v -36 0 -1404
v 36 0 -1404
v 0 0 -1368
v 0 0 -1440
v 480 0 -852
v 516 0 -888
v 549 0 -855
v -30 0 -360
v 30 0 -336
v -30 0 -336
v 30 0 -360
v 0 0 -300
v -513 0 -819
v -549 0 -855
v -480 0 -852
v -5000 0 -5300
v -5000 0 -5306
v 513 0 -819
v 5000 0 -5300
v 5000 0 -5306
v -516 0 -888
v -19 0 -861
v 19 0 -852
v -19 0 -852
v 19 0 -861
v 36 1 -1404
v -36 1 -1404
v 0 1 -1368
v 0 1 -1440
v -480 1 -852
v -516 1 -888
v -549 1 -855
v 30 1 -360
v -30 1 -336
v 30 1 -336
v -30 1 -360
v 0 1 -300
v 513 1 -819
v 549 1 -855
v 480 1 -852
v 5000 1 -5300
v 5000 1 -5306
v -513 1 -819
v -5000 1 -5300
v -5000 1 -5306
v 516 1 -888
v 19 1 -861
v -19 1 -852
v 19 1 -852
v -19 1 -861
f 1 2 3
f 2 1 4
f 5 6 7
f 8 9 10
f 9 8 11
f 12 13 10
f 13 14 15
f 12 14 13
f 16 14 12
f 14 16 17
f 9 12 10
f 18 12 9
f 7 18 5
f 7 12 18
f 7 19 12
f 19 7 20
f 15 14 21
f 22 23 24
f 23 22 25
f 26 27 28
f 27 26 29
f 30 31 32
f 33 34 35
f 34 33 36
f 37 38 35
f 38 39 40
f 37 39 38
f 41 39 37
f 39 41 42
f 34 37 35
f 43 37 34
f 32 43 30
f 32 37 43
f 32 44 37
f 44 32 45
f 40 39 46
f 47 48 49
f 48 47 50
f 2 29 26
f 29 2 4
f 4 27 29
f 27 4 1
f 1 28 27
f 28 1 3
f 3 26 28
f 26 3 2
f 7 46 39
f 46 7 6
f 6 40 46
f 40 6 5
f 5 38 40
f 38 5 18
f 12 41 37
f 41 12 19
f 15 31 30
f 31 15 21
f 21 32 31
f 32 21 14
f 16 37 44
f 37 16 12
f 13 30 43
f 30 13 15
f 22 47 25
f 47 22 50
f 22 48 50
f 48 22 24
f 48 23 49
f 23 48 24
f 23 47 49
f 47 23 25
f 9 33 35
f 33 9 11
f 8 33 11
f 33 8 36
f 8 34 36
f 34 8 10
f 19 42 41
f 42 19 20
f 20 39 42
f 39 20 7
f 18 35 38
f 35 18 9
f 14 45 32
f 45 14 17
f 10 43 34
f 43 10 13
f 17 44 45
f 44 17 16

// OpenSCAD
$fs = 120;

$vpt = [0,1080,480];
$vpr = [-34,0,0];
$vpf = 45;

foul_line = 6;
plain_color = [1,1,1,0.8];
out_color = [1,0.75,0.75,0.8];
eat_color = [0.5,0.75,1,0.8];

// home, first, second, third, rubber
color([1,1,1]) scale([1,-1,-1]) rotate([90,0,0]) linear_extrude(1) {
    polygon([[-30,30*2+300],[30,30*2+300],[30,30+300],[0,300],[-30,30+300]]);
    polygon([[552-36*2,852],[552-36,852+36],[552,852],[552-36,852-36]]);
    polygon([[0,1404+36],[36,1404],[0,1404-36],[-36,1404]]);
    polygon([[-552+36*2,852],[-552+36,852+36],[-552,852],[-552+36,852-36]]);
    polygon([[-19,852],[19,852],[19,9+852],[-19,9+852]]);
}

// foul lines
color([1,1,1,0.5]) scale([1,-1,-1]) rotate([90,0,0]) linear_extrude(1) {
    polygon([[0,300],[-5000,300+5000],[-5000,300+5000+foul_line],[0,300+foul_line]]);
    polygon([[0,300],[5000,300+5000],[5000,300+5000+foul_line],[0,300+foul_line]]);
}

scale([0.1,0.1,-0.1]) translate([-23200,0,0]) {
    color(out_color) polyhedron([[5770,0,15185],[23966,0,33393],[5770,600,15185],[23966,600,33393]], [[0,1,3,2]]);
    color(out_color) polyhedron([[5770,0,15185],[5770,0,15195],[5770,600,15185],[5770,600,15195]], [[0,1,3,2]]);
    color(out_color) polyhedron([[23966,0,33393],[23966,0,33493],[23966,600,33393],[23966,600,33493]], [[0,1,3,2]]);
    color(out_color) polyhedron([[5770,0,15195],[23966,0,33493],[5770,600,15195],[23966,600,33493]], [[0,1,3,2]]);
    color(out_color) polyhedron([[5770,600,15185],[5770,600,15195],[23966,600,33393],[23966,600,33493]], [[0,1,3,2]]);
    color(out_color) polyhedron([[10460,0,23160],[10770,0,23610],[10460,20000,23160],[10770,20000,23610]], [[0,1,3,2]]);
    color(out_color) polyhedron([[10460,0,23160],[10460,0,23170],[10460,20000,23160],[10460,20000,23170]], [[0,1,3,2]]);
    color(out_color) polyhedron([[10770,0,23610],[10770,0,23650],[10770,20000,23610],[10770,20000,23650]], [[0,1,3,2]]);
    color(out_color) polyhedron([[10460,0,23170],[10770,0,23650],[10460,20000,23170],[10770,20000,23650]], [[0,1,3,2]]);
    color(out_color) polyhedron([[10460,20000,23160],[10460,20000,23170],[10770,20000,23610],[10770,20000,23650]], [[0,1,3,2]]);
    color(out_color) polyhedron([[14730,0,27560],[18470,0,30820],[14730,1500,27560],[18470,1500,30820]], [[0,1,3,2]]);
    color(out_color) polyhedron([[14730,0,27560],[12749,0,28980],[14730,1500,27560],[12749,1500,28980]], [[0,1,3,2]]);
    color(out_color) polyhedron([[18470,0,30820],[16500,0,33600],[18470,1500,30820],[16500,1500,33600]], [[0,1,3,2]]);
    color(out_color) polyhedron([[12749,0,28980],[16500,0,33600],[12749,1500,28980],[16500,1500,33600]], [[0,1,3,2]]);
    color(out_color) polyhedron([[14730,1500,27560],[12749,1500,28980],[18470,1500,30820],[16500,1500,33600]], [[0,1,3,2]]);
    color(out_color) polyhedron([[18480,0,30820],[20430,0,32940],[18480,1000,30820],[20430,1000,32940]], [[0,1,3,2]]);
    color(out_color) polyhedron([[18480,0,30820],[16500,0,33600],[18480,1000,30820],[16500,1000,33600]], [[0,1,3,2]]);
    color(out_color) polyhedron([[20430,0,32940],[17698,0,34360],[20430,1000,32940],[17698,1000,34360]], [[0,1,3,2]]);
    color(out_color) polyhedron([[16500,0,33600],[17698,0,34360],[16500,1000,33600],[17698,1000,34360]], [[0,1,3,2]]);
    color(out_color) polyhedron([[18480,1000,30820],[16500,1000,33600],[20430,1000,32940],[17698,1000,34360]], [[0,1,3,2]]);
    color(out_color) polyhedron([[21320,0,33820],[23710,0,36505],[21320,10000,33820],[23710,10000,36505]], [[0,1,3,2]]);
    color(out_color) polyhedron([[21320,0,33820],[19873,0,36432],[21320,10000,33820],[19873,10000,36432]], [[0,1,3,2]]);
    color(out_color) polyhedron([[23710,0,36505],[28681,0,46300],[23710,10000,36505],[28681,10000,46300]], [[0,1,3,2]]);
    color(out_color) polyhedron([[19873,0,36432],[28681,0,46300],[19873,10000,36432],[28681,10000,46300]], [[0,1,3,2]]);
    color(out_color) polyhedron([[21320,10000,33820],[19873,10000,36432],[23710,10000,36505],[28681,10000,46300]], [[0,1,3,2]]);
    color(out_color) polyhedron([[33370,0,22930],[41890,0,31120],[33370,20000,22930],[41890,20000,31120]], [[0,1,3,2]]);
    color(out_color) polyhedron([[33370,0,22930],[23976,0,33393],[33370,20000,22930],[23976,20000,33393]], [[0,1,3,2]]);
    color(out_color) polyhedron([[41890,0,31120],[24076,0,33693],[41890,20000,31120],[24076,20000,33693]], [[0,1,3,2]]);
    color(out_color) polyhedron([[23976,0,33393],[24076,0,33693],[23976,20000,33393],[24076,20000,33693]], [[0,1,3,2]]);
    color(out_color) polyhedron([[33370,20000,22930],[23976,20000,33393],[41890,20000,31120],[24076,20000,33693]], [[0,1,3,2]]);
    color(out_color) polyhedron([[33369,0,22930],[40000,0,18357],[33369,1900,22930],[40000,1900,18357]], [[0,1,3,2]]);
    color(out_color) polyhedron([[33369,0,22930],[33369,0,22940],[33369,1900,22930],[33369,1900,22940]], [[0,1,3,2]]);
    color(out_color) polyhedron([[40000,0,18357],[40000,0,18367],[40000,1900,18357],[40000,1900,18367]], [[0,1,3,2]]);
    color(out_color) polyhedron([[33369,0,22940],[40000,0,18367],[33369,1900,22940],[40000,1900,18367]], [[0,1,3,2]]);
    color(out_color) polyhedron([[33369,1900,22930],[33369,1900,22940],[40000,1900,18357],[40000,1900,18367]], [[0,1,3,2]]);
    color(out_color) polyhedron([[36160,0,23390],[37630,0,24803],[36160,1200,23390],[37630,1200,24803]], [[0,1,3,2]]);
    color(out_color) polyhedron([[36160,0,23390],[35280,0,24766],[36160,1200,23390],[35280,1600,24766]], [[0,1,3,2]]);
    color(out_color) polyhedron([[37630,0,24803],[36750,0,26180],[37630,1200,24803],[36750,1600,26180]], [[0,1,3,2]]);
    color(out_color) polyhedron([[35280,0,24766],[36750,0,26180],[35280,1600,24766],[36750,1600,26180]], [[0,1,3,2]]);
    color(out_color) polyhedron([[36160,1200,23390],[35280,1600,24766],[37630,1200,24803],[36750,1600,26180]], [[0,1,3,2]]);
    color(out_color) polyhedron([[27830,0,1910],[33470,0,7440],[27830,5,1910],[33470,5,7440]], [[0,1,3,2]]);
    color(out_color) polyhedron([[27830,0,1910],[27840,0,1910],[27830,5,1910],[27840,5,1910]], [[0,1,3,2]]);
    color(out_color) polyhedron([[33470,0,7440],[33480,0,7440],[33470,5,7440],[33480,5,7440]], [[0,1,3,2]]);
    color(out_color) polyhedron([[27840,0,1910],[33480,0,7440],[27840,5,1910],[33480,5,7440]], [[0,1,3,2]]);
    color(out_color) polyhedron([[27830,5,1910],[27840,5,1910],[33470,5,7440],[33480,5,7440]], [[0,1,3,2]]);
    color(out_color) polyhedron([[13960,0,4590],[18500,0,4590],[13960,5,4590],[18500,5,4590]], [[0,1,3,2]]);
    color(out_color) polyhedron([[13960,0,4590],[13960,0,4690],[13960,5,4590],[13960,5,4690]], [[0,1,3,2]]);
    color(out_color) polyhedron([[18500,0,4590],[18500,0,4690],[18500,5,4590],[18500,5,4690]], [[0,1,3,2]]);
    color(out_color) polyhedron([[13960,0,4690],[18500,0,4690],[13960,5,4690],[18500,5,4690]], [[0,1,3,2]]);
    color(out_color) polyhedron([[13960,5,4590],[13960,5,4690],[18500,5,4590],[18500,5,4690]], [[0,1,3,2]]);
    color(out_color) polyhedron([[19090,0,1880],[19190,0,1880],[19090,5,1880],[19190,5,1880]], [[0,1,3,2]]);
    color(out_color) polyhedron([[19090,0,1880],[18500,0,4560],[19090,5,1880],[18500,5,4560]], [[0,1,3,2]]);
    color(out_color) polyhedron([[19190,0,1880],[18600,0,4560],[19190,5,1880],[18600,5,4560]], [[0,1,3,2]]);
    color(out_color) polyhedron([[18500,0,4560],[18600,0,4560],[18500,5,4560],[18600,5,4560]], [[0,1,3,2]]);
    color(out_color) polyhedron([[19090,5,1880],[18500,5,4560],[19190,5,1880],[18600,5,4560]], [[0,1,3,2]]);
    color(plain_color) polyhedron([[0,0,0],[0,0,0],[0,0,0],[0,0,0]], [[0,1,3,2]]);
    color(plain_color) polyhedron([[0,0,0],[0,0,0],[0,0,0],[0,0,0]], [[0,1,3,2]]);
    color(plain_color) polyhedron([[0,0,0],[0,0,0],[0,0,0],[0,0,0]], [[0,1,3,2]]);
    color(plain_color) polyhedron([[0,0,0],[0,0,0],[0,0,0],[0,0,0]], [[0,1,3,2]]);
    color(plain_color) polyhedron([[0,0,0],[0,0,0],[0,0,0],[0,0,0]], [[0,1,3,2]]);
    color(plain_color) polyhedron([[0,0,0],[0,0,0],[0,0,0],[0,0,0]], [[0,1,3,2]]);
    color(plain_color) polyhedron([[0,0,0],[0,0,0],[0,0,0],[0,0,0]], [[0,1,3,2]]);
    color(plain_color) polyhedron([[0,0,0],[0,0,0],[0,0,0],[0,0,0]], [[0,1,3,2]]);
    color(plain_color) polyhedron([[0,0,0],[0,0,0],[0,0,0],[0,0,0]], [[0,1,3,2]]);
    color(plain_color) polyhedron([[0,0,0],[0,0,0],[0,0,0],[0,0,0]], [[0,1,3,2]]);
    color(plain_color) polyhedron([[0,0,0],[0,0,0],[0,0,0],[0,0,0]], [[0,1,3,2]]);
    color(plain_color) polyhedron([[0,0,0],[0,0,0],[0,0,0],[0,0,0]], [[0,1,3,2]]);
    color(plain_color) polyhedron([[0,0,0],[0,0,0],[0,0,0],[0,0,0]], [[0,1,3,2]]);
    color(plain_color) polyhedron([[0,0,0],[0,0,0],[0,0,0],[0,0,0]], [[0,1,3,2]]);
    color(plain_color) polyhedron([[0,0,0],[0,0,0],[0,0,0],[0,0,0]], [[0,1,3,2]]);
    color(plain_color) polyhedron([[0,0,0],[0,0,0],[0,0,0],[0,0,0]], [[0,1,3,2]]);
    color(plain_color) polyhedron([[0,0,0],[0,0,0],[0,0,0],[0,0,0]], [[0,1,3,2]]);
    color(plain_color) polyhedron([[0,0,0],[0,0,0],[0,0,0],[0,0,0]], [[0,1,3,2]]);
    color(plain_color) polyhedron([[0,0,0],[0,0,0],[0,0,0],[0,0,0]], [[0,1,3,2]]);
    color(plain_color) polyhedron([[0,0,0],[0,0,0],[0,0,0],[0,0,0]], [[0,1,3,2]]);
    color(plain_color) polyhedron([[0,0,0],[0,0,0],[0,0,0],[0,0,0]], [[0,1,3,2]]);
    color(plain_color) polyhedron([[0,0,0],[0,0,0],[0,0,0],[0,0,0]], [[0,1,3,2]]);
    color(plain_color) polyhedron([[0,0,0],[0,0,0],[0,0,0],[0,0,0]], [[0,1,3,2]]);
    color(plain_color) polyhedron([[0,0,0],[0,0,0],[0,0,0],[0,0,0]], [[0,1,3,2]]);
    color(plain_color) polyhedron([[0,0,0],[0,0,0],[0,0,0],[0,0,0]], [[0,1,3,2]]);
    color(plain_color) polyhedron([[0,0,0],[0,0,0],[0,0,0],[0,0,0]], [[0,1,3,2]]);
    color(plain_color) polyhedron([[0,0,0],[0,0,0],[0,0,0],[0,0,0]], [[0,1,3,2]]);
    color(plain_color) polyhedron([[0,0,0],[0,0,0],[0,0,0],[0,0,0]], [[0,1,3,2]]);
    color(plain_color) polyhedron([[0,0,0],[0,0,0],[0,0,0],[0,0,0]], [[0,1,3,2]]);
    color(plain_color) polyhedron([[0,0,0],[0,0,0],[0,0,0],[0,0,0]], [[0,1,3,2]]);
    color(plain_color) polyhedron([[0,0,0],[0,0,0],[0,0,0],[0,0,0]], [[0,1,3,2]]);
    color(plain_color) polyhedron([[0,0,0],[0,0,0],[0,0,0],[0,0,0]], [[0,1,3,2]]);
    color(plain_color) polyhedron([[0,0,0],[0,0,0],[0,0,0],[0,0,0]], [[0,1,3,2]]);
    color(plain_color) polyhedron([[0,0,0],[0,0,0],[0,0,0],[0,0,0]], [[0,1,3,2]]);
    color(plain_color) polyhedron([[0,0,0],[0,0,0],[0,0,0],[0,0,0]], [[0,1,3,2]]);
    color(plain_color) polyhedron([[0,0,0],[0,0,0],[0,0,0],[0,0,0]], [[0,1,3,2]]);
    color(plain_color) polyhedron([[0,0,0],[0,0,0],[0,0,0],[0,0,0]], [[0,1,3,2]]);
    color(plain_color) polyhedron([[0,0,0],[0,0,0],[0,0,0],[0,0,0]], [[0,1,3,2]]);
    color(plain_color) polyhedron([[0,0,0],[0,0,0],[0,0,0],[0,0,0]], [[0,1,3,2]]);
    color(plain_color) polyhedron([[0,0,0],[0,0,0],[0,0,0],[0,0,0]], [[0,1,3,2]]);
    color(plain_color) polyhedron([[0,0,0],[0,0,0],[0,0,0],[0,0,0]], [[0,1,3,2]]);
    color(plain_color) polyhedron([[0,0,0],[0,0,0],[0,0,0],[0,0,0]], [[0,1,3,2]]);
    color(plain_color) polyhedron([[0,0,0],[0,0,0],[0,0,0],[0,0,0]], [[0,1,3,2]]);
    color(plain_color) polyhedron([[0,0,0],[0,0,0],[0,0,0],[0,0,0]], [[0,1,3,2]]);
    color(plain_color) polyhedron([[0,0,0],[0,0,0],[0,0,0],[0,0,0]], [[0,1,3,2]]);
    color(plain_color) polyhedron([[0,0,0],[0,0,0],[0,0,0],[0,0,0]], [[0,1,3,2]]);
    color(plain_color) polyhedron([[0,0,0],[0,0,0],[0,0,0],[0,0,0]], [[0,1,3,2]]);
    color(plain_color) polyhedron([[0,0,0],[0,0,0],[0,0,0],[0,0,0]], [[0,1,3,2]]);
    color(plain_color) polyhedron([[0,0,0],[0,0,0],[0,0,0],[0,0,0]], [[0,1,3,2]]);
    color(plain_color) polyhedron([[0,0,0],[0,0,0],[0,0,0],[0,0,0]], [[0,1,3,2]]);
    color(plain_color) polyhedron([[0,0,0],[0,0,0],[0,0,0],[0,0,0]], [[0,1,3,2]]);
    color(plain_color) polyhedron([[0,0,0],[0,0,0],[0,0,0],[0,0,0]], [[0,1,3,2]]);
    color(plain_color) polyhedron([[0,0,0],[0,0,0],[0,0,0],[0,0,0]], [[0,1,3,2]]);
    color(plain_color) polyhedron([[0,0,0],[0,0,0],[0,0,0],[0,0,0]], [[0,1,3,2]]);
    color(plain_color) polyhedron([[0,0,0],[0,0,0],[0,0,0],[0,0,0]], [[0,1,3,2]]);
    color(plain_color) polyhedron([[0,0,0],[0,0,0],[0,0,0],[0,0,0]], [[0,1,3,2]]);
    color(plain_color) polyhedron([[0,0,0],[0,0,0],[0,0,0],[0,0,0]], [[0,1,3,2]]);
    color(plain_color) polyhedron([[0,0,0],[0,0,0],[0,0,0],[0,0,0]], [[0,1,3,2]]);
    color(plain_color) polyhedron([[0,0,0],[0,0,0],[0,0,0],[0,0,0]], [[0,1,3,2]]);
    color(plain_color) polyhedron([[0,0,0],[0,0,0],[0,0,0],[0,0,0]], [[0,1,3,2]]);
    color(plain_color) polyhedron([[0,0,0],[0,0,0],[0,0,0],[0,0,0]], [[0,1,3,2]]);
    color(plain_color) polyhedron([[0,0,0],[0,0,0],[0,0,0],[0,0,0]], [[0,1,3,2]]);
    color(plain_color) polyhedron([[0,0,0],[0,0,0],[0,0,0],[0,0,0]], [[0,1,3,2]]);
    color(plain_color) polyhedron([[0,0,0],[0,0,0],[0,0,0],[0,0,0]], [[0,1,3,2]]);
    color(plain_color) polyhedron([[0,0,0],[0,0,0],[0,0,0],[0,0,0]], [[0,1,3,2]]);
    color(plain_color) polyhedron([[0,0,0],[0,0,0],[0,0,0],[0,0,0]], [[0,1,3,2]]);
    color(plain_color) polyhedron([[0,0,0],[0,0,0],[0,0,0],[0,0,0]], [[0,1,3,2]]);
    color(plain_color) polyhedron([[0,0,0],[0,0,0],[0,0,0],[0,0,0]], [[0,1,3,2]]);
    color(plain_color) polyhedron([[0,0,0],[0,0,0],[0,0,0],[0,0,0]], [[0,1,3,2]]);
    color(plain_color) polyhedron([[0,0,0],[0,0,0],[0,0,0],[0,0,0]], [[0,1,3,2]]);
    color(plain_color) polyhedron([[0,0,0],[0,0,0],[0,0,0],[0,0,0]], [[0,1,3,2]]);
    color(plain_color) polyhedron([[0,0,0],[0,0,0],[0,0,0],[0,0,0]], [[0,1,3,2]]);
    color(plain_color) polyhedron([[0,0,0],[0,0,0],[0,0,0],[0,0,0]], [[0,1,3,2]]);
    color(plain_color) polyhedron([[0,0,0],[0,0,0],[0,0,0],[0,0,0]], [[0,1,3,2]]);
    color(plain_color) polyhedron([[0,0,0],[0,0,0],[0,0,0],[0,0,0]], [[0,1,3,2]]);
    color(plain_color) polyhedron([[0,0,0],[0,0,0],[0,0,0],[0,0,0]], [[0,1,3,2]]);
    color(plain_color) polyhedron([[0,0,0],[0,0,0],[0,0,0],[0,0,0]], [[0,1,3,2]]);
    color(plain_color) polyhedron([[0,0,0],[0,0,0],[0,0,0],[0,0,0]], [[0,1,3,2]]);
    color(plain_color) polyhedron([[0,0,0],[0,0,0],[0,0,0],[0,0,0]], [[0,1,3,2]]);
    color(plain_color) polyhedron([[0,0,0],[0,0,0],[0,0,0],[0,0,0]], [[0,1,3,2]]);
    color(plain_color) polyhedron([[0,0,0],[0,0,0],[0,0,0],[0,0,0]], [[0,1,3,2]]);
    color(plain_color) polyhedron([[0,0,0],[0,0,0],[0,0,0],[0,0,0]], [[0,1,3,2]]);
    color(plain_color) polyhedron([[0,0,0],[0,0,0],[0,0,0],[0,0,0]], [[0,1,3,2]]);
    color(plain_color) polyhedron([[0,0,0],[0,0,0],[0,0,0],[0,0,0]], [[0,1,3,2]]);
    color(plain_color) polyhedron([[0,0,0],[0,0,0],[0,0,0],[0,0,0]], [[0,1,3,2]]);
    color(plain_color) polyhedron([[0,0,0],[0,0,0],[0,0,0],[0,0,0]], [[0,1,3,2]]);
    color(plain_color) polyhedron([[0,0,0],[0,0,0],[0,0,0],[0,0,0]], [[0,1,3,2]]);
    color(plain_color) polyhedron([[0,0,0],[0,0,0],[0,0,0],[0,0,0]], [[0,1,3,2]]);
    color(plain_color) polyhedron([[0,0,0],[0,0,0],[0,0,0],[0,0,0]], [[0,1,3,2]]);
    color(plain_color) polyhedron([[0,0,0],[0,0,0],[0,0,0],[0,0,0]], [[0,1,3,2]]);
    color(plain_color) polyhedron([[0,0,0],[0,0,0],[0,0,0],[0,0,0]], [[0,1,3,2]]);
    color(plain_color) polyhedron([[0,0,0],[0,0,0],[0,0,0],[0,0,0]], [[0,1,3,2]]);
    color(plain_color) polyhedron([[0,0,0],[0,0,0],[0,0,0],[0,0,0]], [[0,1,3,2]]);
    color(plain_color) polyhedron([[0,0,0],[0,0,0],[0,0,0],[0,0,0]], [[0,1,3,2]]);
    color(plain_color) polyhedron([[0,0,0],[0,0,0],[0,0,0],[0,0,0]], [[0,1,3,2]]);
    color(plain_color) polyhedron([[0,0,0],[0,0,0],[0,0,0],[0,0,0]], [[0,1,3,2]]);
    color(plain_color) polyhedron([[0,0,0],[0,0,0],[0,0,0],[0,0,0]], [[0,1,3,2]]);
    color(plain_color) polyhedron([[0,0,0],[0,0,0],[0,0,0],[0,0,0]], [[0,1,3,2]]);
    color(plain_color) polyhedron([[0,0,0],[0,0,0],[0,0,0],[0,0,0]], [[0,1,3,2]]);
    color(plain_color) polyhedron([[0,0,0],[0,0,0],[0,0,0],[0,0,0]], [[0,1,3,2]]);
    color(plain_color) polyhedron([[0,0,0],[0,0,0],[0,0,0],[0,0,0]], [[0,1,3,2]]);
    color(plain_color) polyhedron([[0,0,0],[0,0,0],[0,0,0],[0,0,0]], [[0,1,3,2]]);
    color(plain_color) polyhedron([[0,0,0],[0,0,0],[0,0,0],[0,0,0]], [[0,1,3,2]]);
    color(plain_color) polyhedron([[0,0,0],[0,0,0],[0,0,0],[0,0,0]], [[0,1,3,2]]);
    color(plain_color) polyhedron([[0,0,0],[0,0,0],[0,0,0],[0,0,0]], [[0,1,3,2]]);
    color(plain_color) polyhedron([[0,0,0],[0,0,0],[0,0,0],[0,0,0]], [[0,1,3,2]]);
    color(plain_color) polyhedron([[0,0,0],[0,0,0],[0,0,0],[0,0,0]], [[0,1,3,2]]);
    color(plain_color) polyhedron([[0,0,0],[0,0,0],[0,0,0],[0,0,0]], [[0,1,3,2]]);
    color(plain_color) polyhedron([[0,0,0],[0,0,0],[0,0,0],[0,0,0]], [[0,1,3,2]]);
    color(plain_color) polyhedron([[0,0,0],[0,0,0],[0,0,0],[0,0,0]], [[0,1,3,2]]);
    color(plain_color) polyhedron([[0,0,0],[0,0,0],[0,0,0],[0,0,0]], [[0,1,3,2]]);
    color(plain_color) polyhedron([[0,0,0],[0,0,0],[0,0,0],[0,0,0]], [[0,1,3,2]]);
    color(plain_color) polyhedron([[0,0,0],[0,0,0],[0,0,0],[0,0,0]], [[0,1,3,2]]);
    color(plain_color) polyhedron([[0,0,0],[0,0,0],[0,0,0],[0,0,0]], [[0,1,3,2]]);
    color(plain_color) polyhedron([[0,0,0],[0,0,0],[0,0,0],[0,0,0]], [[0,1,3,2]]);
    color(plain_color) polyhedron([[0,0,0],[0,0,0],[0,0,0],[0,0,0]], [[0,1,3,2]]);
    color(plain_color) polyhedron([[0,0,0],[0,0,0],[0,0,0],[0,0,0]], [[0,1,3,2]]);
    color(plain_color) polyhedron([[0,0,0],[0,0,0],[0,0,0],[0,0,0]], [[0,1,3,2]]);
    color(plain_color) polyhedron([[0,0,0],[0,0,0],[0,0,0],[0,0,0]], [[0,1,3,2]]);
    color(plain_color) polyhedron([[0,0,0],[0,0,0],[0,0,0],[0,0,0]], [[0,1,3,2]]);
    color(plain_color) polyhedron([[0,0,0],[0,0,0],[0,0,0],[0,0,0]], [[0,1,3,2]]);
    color(plain_color) polyhedron([[0,0,0],[0,0,0],[0,0,0],[0,0,0]], [[0,1,3,2]]);
    color(plain_color) polyhedron([[0,0,0],[0,0,0],[0,0,0],[0,0,0]], [[0,1,3,2]]);
    color(plain_color) polyhedron([[0,0,0],[0,0,0],[0,0,0],[0,0,0]], [[0,1,3,2]]);
    color(plain_color) polyhedron([[0,0,0],[0,0,0],[0,0,0],[0,0,0]], [[0,1,3,2]]);
    color(plain_color) polyhedron([[0,0,0],[0,0,0],[0,0,0],[0,0,0]], [[0,1,3,2]]);
    color(plain_color) polyhedron([[0,0,0],[0,0,0],[0,0,0],[0,0,0]], [[0,1,3,2]]);
    color(plain_color) polyhedron([[0,0,0],[0,0,0],[0,0,0],[0,0,0]], [[0,1,3,2]]);
    color(plain_color) polyhedron([[0,0,0],[0,0,0],[0,0,0],[0,0,0]], [[0,1,3,2]]);
    color(plain_color) polyhedron([[0,0,0],[0,0,0],[0,0,0],[0,0,0]], [[0,1,3,2]]);
    color(plain_color) polyhedron([[0,0,0],[0,0,0],[0,0,0],[0,0,0]], [[0,1,3,2]]);
    color(plain_color) polyhedron([[0,0,0],[0,0,0],[0,0,0],[0,0,0]], [[0,1,3,2]]);
    color(plain_color) polyhedron([[0,0,0],[0,0,0],[0,0,0],[0,0,0]], [[0,1,3,2]]);
    color(plain_color) polyhedron([[0,0,0],[0,0,0],[0,0,0],[0,0,0]], [[0,1,3,2]]);
    color(plain_color) polyhedron([[0,0,0],[0,0,0],[0,0,0],[0,0,0]], [[0,1,3,2]]);
    color(plain_color) polyhedron([[0,0,0],[0,0,0],[0,0,0],[0,0,0]], [[0,1,3,2]]);
    color(plain_color) polyhedron([[0,0,0],[0,0,0],[0,0,0],[0,0,0]], [[0,1,3,2]]);
    color(plain_color) polyhedron([[0,0,0],[0,0,0],[0,0,0],[0,0,0]], [[0,1,3,2]]);
    color(plain_color) polyhedron([[0,0,0],[0,0,0],[0,0,0],[0,0,0]], [[0,1,3,2]]);
    color(plain_color) polyhedron([[0,0,0],[0,0,0],[0,0,0],[0,0,0]], [[0,1,3,2]]);
    color(plain_color) polyhedron([[0,0,0],[0,0,0],[0,0,0],[0,0,0]], [[0,1,3,2]]);
    color(plain_color) polyhedron([[0,0,0],[0,0,0],[0,0,0],[0,0,0]], [[0,1,3,2]]);
    color(plain_color) polyhedron([[0,0,0],[0,0,0],[0,0,0],[0,0,0]], [[0,1,3,2]]);
    color(plain_color) polyhedron([[0,0,0],[0,0,0],[0,0,0],[0,0,0]], [[0,1,3,2]]);
    color(plain_color) polyhedron([[0,0,0],[0,0,0],[0,0,0],[0,0,0]], [[0,1,3,2]]);
    color(plain_color) polyhedron([[0,0,0],[0,0,0],[0,0,0],[0,0,0]], [[0,1,3,2]]);
    color(plain_color) polyhedron([[0,0,0],[0,0,0],[0,0,0],[0,0,0]], [[0,1,3,2]]);
    color(plain_color) polyhedron([[0,0,0],[0,0,0],[0,0,0],[0,0,0]], [[0,1,3,2]]);
    color(plain_color) polyhedron([[0,0,0],[0,0,0],[0,0,0],[0,0,0]], [[0,1,3,2]]);
    color(plain_color) polyhedron([[0,0,0],[0,0,0],[0,0,0],[0,0,0]], [[0,1,3,2]]);
    color(plain_color) polyhedron([[0,0,0],[0,0,0],[0,0,0],[0,0,0]], [[0,1,3,2]]);
    color(plain_color) polyhedron([[0,0,0],[0,0,0],[0,0,0],[0,0,0]], [[0,1,3,2]]);
    color(plain_color) polyhedron([[0,0,0],[0,0,0],[0,0,0],[0,0,0]], [[0,1,3,2]]);
    color(plain_color) polyhedron([[0,0,0],[0,0,0],[0,0,0],[0,0,0]], [[0,1,3,2]]);
    color(plain_color) polyhedron([[0,0,0],[0,0,0],[0,0,0],[0,0,0]], [[0,1,3,2]]);
    color(plain_color) polyhedron([[0,0,0],[0,0,0],[0,0,0],[0,0,0]], [[0,1,3,2]]);
    color(plain_color) polyhedron([[0,0,0],[0,0,0],[0,0,0],[0,0,0]], [[0,1,3,2]]);
    color(plain_color) polyhedron([[0,0,0],[0,0,0],[0,0,0],[0,0,0]], [[0,1,3,2]]);
    color(plain_color) polyhedron([[0,0,0],[0,0,0],[0,0,0],[0,0,0]], [[0,1,3,2]]);
    color(plain_color) polyhedron([[0,0,0],[0,0,0],[0,0,0],[0,0,0]], [[0,1,3,2]]);
    color(plain_color) polyhedron([[0,0,0],[0,0,0],[0,0,0],[0,0,0]], [[0,1,3,2]]);
    color(plain_color) polyhedron([[0,0,0],[0,0,0],[0,0,0],[0,0,0]], [[0,1,3,2]]);
    color(plain_color) polyhedron([[0,0,0],[0,0,0],[0,0,0],[0,0,0]], [[0,1,3,2]]);
    color(plain_color) polyhedron([[0,0,0],[0,0,0],[0,0,0],[0,0,0]], [[0,1,3,2]]);
    color(plain_color) polyhedron([[0,0,0],[0,0,0],[0,0,0],[0,0,0]], [[0,1,3,2]]);
    color(plain_color) polyhedron([[0,0,0],[0,0,0],[0,0,0],[0,0,0]], [[0,1,3,2]]);
    color(plain_color) polyhedron([[0,0,0],[0,0,0],[0,0,0],[0,0,0]], [[0,1,3,2]]);
    color(plain_color) polyhedron([[0,0,0],[0,0,0],[0,0,0],[0,0,0]], [[0,1,3,2]]);
    color(plain_color) polyhedron([[0,0,0],[0,0,0],[0,0,0],[0,0,0]], [[0,1,3,2]]);
    color(plain_color) polyhedron([[0,0,0],[0,0,0],[0,0,0],[0,0,0]], [[0,1,3,2]]);
    color(plain_color) polyhedron([[0,0,0],[0,0,0],[0,0,0],[0,0,0]], [[0,1,3,2]]);
    color(plain_color) polyhedron([[0,0,0],[0,0,0],[0,0,0],[0,0,0]], [[0,1,3,2]]);
    color(plain_color) polyhedron([[0,0,0],[0,0,0],[0,0,0],[0,0,0]], [[0,1,3,2]]);
    color(plain_color) polyhedron([[0,0,0],[0,0,0],[0,0,0],[0,0,0]], [[0,1,3,2]]);
    color(plain_color) polyhedron([[0,0,0],[0,0,0],[0,0,0],[0,0,0]], [[0,1,3,2]]);
    color(plain_color) polyhedron([[0,0,0],[0,0,0],[0,0,0],[0,0,0]], [[0,1,3,2]]);
    color(plain_color) polyhedron([[0,0,0],[0,0,0],[0,0,0],[0,0,0]], [[0,1,3,2]]);
    color(plain_color) polyhedron([[0,0,0],[0,0,0],[0,0,0],[0,0,0]], [[0,1,3,2]]);
    color(plain_color) polyhedron([[0,0,0],[0,0,0],[0,0,0],[0,0,0]], [[0,1,3,2]]);
    color(plain_color) polyhedron([[0,0,0],[0,0,0],[0,0,0],[0,0,0]], [[0,1,3,2]]);
    color(plain_color) polyhedron([[0,0,0],[0,0,0],[0,0,0],[0,0,0]], [[0,1,3,2]]);
    color(plain_color) polyhedron([[0,0,0],[0,0,0],[0,0,0],[0,0,0]], [[0,1,3,2]]);
    color(plain_color) polyhedron([[0,0,0],[0,0,0],[0,0,0],[0,0,0]], [[0,1,3,2]]);
    color(plain_color) polyhedron([[0,0,0],[0,0,0],[0,0,0],[0,0,0]], [[0,1,3,2]]);
    color(plain_color) polyhedron([[0,0,0],[0,0,0],[0,0,0],[0,0,0]], [[0,1,3,2]]);
    color(plain_color) polyhedron([[0,0,0],[0,0,0],[0,0,0],[0,0,0]], [[0,1,3,2]]);
    color(plain_color) polyhedron([[0,0,0],[0,0,0],[0,0,0],[0,0,0]], [[0,1,3,2]]);
    color(plain_color) polyhedron([[0,0,0],[0,0,0],[0,0,0],[0,0,0]], [[0,1,3,2]]);
    color(plain_color) polyhedron([[0,0,0],[0,0,0],[0,0,0],[0,0,0]], [[0,1,3,2]]);
    color(plain_color) polyhedron([[0,0,0],[0,0,0],[0,0,0],[0,0,0]], [[0,1,3,2]]);
    color(plain_color) polyhedron([[0,0,0],[0,0,0],[0,0,0],[0,0,0]], [[0,1,3,2]]);
    color(plain_color) polyhedron([[0,0,0],[0,0,0],[0,0,0],[0,0,0]], [[0,1,3,2]]);
    color(plain_color) polyhedron([[0,0,0],[0,0,0],[0,0,0],[0,0,0]], [[0,1,3,2]]);
    color(plain_color) polyhedron([[0,0,0],[0,0,0],[0,0,0],[0,0,0]], [[0,1,3,2]]);
    color(plain_color) polyhedron([[0,0,0],[0,0,0],[0,0,0],[0,0,0]], [[0,1,3,2]]);
    color(plain_color) polyhedron([[0,0,0],[0,0,0],[0,0,0],[0,0,0]], [[0,1,3,2]]);
    color(plain_color) polyhedron([[0,0,0],[0,0,0],[0,0,0],[0,0,0]], [[0,1,3,2]]);
    color(plain_color) polyhedron([[0,0,0],[0,0,0],[0,0,0],[0,0,0]], [[0,1,3,2]]);
    color(plain_color) polyhedron([[0,0,0],[0,0,0],[0,0,0],[0,0,0]], [[0,1,3,2]]);
    color(plain_color) polyhedron([[0,0,0],[0,0,0],[0,0,0],[0,0,0]], [[0,1,3,2]]);
    color(plain_color) polyhedron([[0,0,0],[0,0,0],[0,0,0],[0,0,0]], [[0,1,3,2]]);
    color(plain_color) polyhedron([[0,0,0],[0,0,0],[0,0,0],[0,0,0]], [[0,1,3,2]]);
    color(plain_color) polyhedron([[0,0,0],[0,0,0],[0,0,0],[0,0,0]], [[0,1,3,2]]);
    color(plain_color) polyhedron([[0,0,0],[0,0,0],[0,0,0],[0,0,0]], [[0,1,3,2]]);
    color(plain_color) polyhedron([[0,0,0],[0,0,0],[0,0,0],[0,0,0]], [[0,1,3,2]]);
    color(plain_color) polyhedron([[0,0,0],[0,0,0],[0,0,0],[0,0,0]], [[0,1,3,2]]);
    color(plain_color) polyhedron([[0,0,0],[0,0,0],[0,0,0],[0,0,0]], [[0,1,3,2]]);
    color(plain_color) polyhedron([[0,0,0],[0,0,0],[0,0,0],[0,0,0]], [[0,1,3,2]]);
    color(plain_color) polyhedron([[0,0,0],[0,0,0],[0,0,0],[0,0,0]], [[0,1,3,2]]);
    color(plain_color) polyhedron([[0,0,0],[0,0,0],[0,0,0],[0,0,0]], [[0,1,3,2]]);
    color(plain_color) polyhedron([[0,0,0],[0,0,0],[0,0,0],[0,0,0]], [[0,1,3,2]]);
    color(plain_color) polyhedron([[0,0,0],[0,0,0],[0,0,0],[0,0,0]], [[0,1,3,2]]);
    color(plain_color) polyhedron([[0,0,0],[0,0,0],[0,0,0],[0,0,0]], [[0,1,3,2]]);
    color(plain_color) polyhedron([[0,0,0],[0,0,0],[0,0,0],[0,0,0]], [[0,1,3,2]]);
    color(plain_color) polyhedron([[0,0,0],[0,0,0],[0,0,0],[0,0,0]], [[0,1,3,2]]);
    color(plain_color) polyhedron([[0,0,0],[0,0,0],[0,0,0],[0,0,0]], [[0,1,3,2]]);
    color(plain_color) polyhedron([[0,0,0],[0,0,0],[0,0,0],[0,0,0]], [[0,1,3,2]]);
    color(plain_color) polyhedron([[0,0,0],[0,0,0],[0,0,0],[0,0,0]], [[0,1,3,2]]);
    color(plain_color) polyhedron([[0,0,0],[0,0,0],[0,0,0],[0,0,0]], [[0,1,3,2]]);
    color(plain_color) polyhedron([[0,0,0],[0,0,0],[0,0,0],[0,0,0]], [[0,1,3,2]]);
    color(plain_color) polyhedron([[0,0,0],[0,0,0],[0,0,0],[0,0,0]], [[0,1,3,2]]);
    color(plain_color) polyhedron([[0,0,0],[0,0,0],[0,0,0],[0,0,0]], [[0,1,3,2]]);
    color(plain_color) polyhedron([[0,0,0],[0,0,0],[0,0,0],[0,0,0]], [[0,1,3,2]]);
    color(plain_color) polyhedron([[0,0,0],[0,0,0],[0,0,0],[0,0,0]], [[0,1,3,2]]);
    color(plain_color) polyhedron([[0,0,0],[0,0,0],[0,0,0],[0,0,0]], [[0,1,3,2]]);
    color(plain_color) polyhedron([[0,0,0],[0,0,0],[0,0,0],[0,0,0]], [[0,1,3,2]]);
    color(plain_color) polyhedron([[0,0,0],[0,0,0],[0,0,0],[0,0,0]], [[0,1,3,2]]);
    color(plain_color) polyhedron([[0,0,0],[0,0,0],[0,0,0],[0,0,0]], [[0,1,3,2]]);
    color(plain_color) polyhedron([[0,0,0],[0,0,0],[0,0,0],[0,0,0]], [[0,1,3,2]]);
    color(plain_color) polyhedron([[0,0,0],[0,0,0],[0,0,0],[0,0,0]], [[0,1,3,2]]);
    color(plain_color) polyhedron([[0,0,0],[0,0,0],[0,0,0],[0,0,0]], [[0,1,3,2]]);
    color(plain_color) polyhedron([[0,0,0],[0,0,0],[0,0,0],[0,0,0]], [[0,1,3,2]]);
    color(plain_color) polyhedron([[0,0,0],[0,0,0],[0,0,0],[0,0,0]], [[0,1,3,2]]);
    color(plain_color) polyhedron([[0,0,0],[0,0,0],[0,0,0],[0,0,0]], [[0,1,3,2]]);
    color(plain_color) polyhedron([[0,0,0],[0,0,0],[0,0,0],[0,0,0]], [[0,1,3,2]]);
    color(plain_color) polyhedron([[0,0,0],[0,0,0],[0,0,0],[0,0,0]], [[0,1,3,2]]);
    color(plain_color) polyhedron([[0,0,0],[0,0,0],[0,0,0],[0,0,0]], [[0,1,3,2]]);
    color(plain_color) polyhedron([[0,0,0],[0,0,0],[0,0,0],[0,0,0]], [[0,1,3,2]]);
    color(plain_color) polyhedron([[0,0,0],[0,0,0],[0,0,0],[0,0,0]], [[0,1,3,2]]);
    color(plain_color) polyhedron([[0,0,0],[0,0,0],[0,0,0],[0,0,0]], [[0,1,3,2]]);
    color(plain_color) polyhedron([[0,0,0],[0,0,0],[0,0,0],[0,0,0]], [[0,1,3,2]]);
    color(plain_color) polyhedron([[0,0,0],[0,0,0],[0,0,0],[0,0,0]], [[0,1,3,2]]);
    color(plain_color) polyhedron([[0,0,0],[0,0,0],[0,0,0],[0,0,0]], [[0,1,3,2]]);
    color(plain_color) polyhedron([[0,0,0],[0,0,0],[0,0,0],[0,0,0]], [[0,1,3,2]]);
    color(plain_color) polyhedron([[0,0,0],[0,0,0],[0,0,0],[0,0,0]], [[0,1,3,2]]);
    color(plain_color) polyhedron([[0,0,0],[0,0,0],[0,0,0],[0,0,0]], [[0,1,3,2]]);
    color(plain_color) polyhedron([[0,0,0],[0,0,0],[0,0,0],[0,0,0]], [[0,1,3,2]]);
    color(plain_color) polyhedron([[0,0,0],[0,0,0],[0,0,0],[0,0,0]], [[0,1,3,2]]);
    color(plain_color) polyhedron([[0,0,0],[0,0,0],[0,0,0],[0,0,0]], [[0,1,3,2]]);
    color(plain_color) polyhedron([[0,0,0],[0,0,0],[0,0,0],[0,0,0]], [[0,1,3,2]]);
    color(plain_color) polyhedron([[0,0,0],[0,0,0],[0,0,0],[0,0,0]], [[0,1,3,2]]);
    color(plain_color) polyhedron([[0,0,0],[0,0,0],[0,0,0],[0,0,0]], [[0,1,3,2]]);
    color(plain_color) polyhedron([[0,0,0],[0,0,0],[0,0,0],[0,0,0]], [[0,1,3,2]]);
    color(plain_color) polyhedron([[0,0,0],[0,0,0],[0,0,0],[0,0,0]], [[0,1,3,2]]);
    color(plain_color) polyhedron([[0,0,0],[0,0,0],[0,0,0],[0,0,0]], [[0,1,3,2]]);
    color(plain_color) polyhedron([[0,0,0],[0,0,0],[0,0,0],[0,0,0]], [[0,1,3,2]]);
    color(plain_color) polyhedron([[0,0,0],[0,0,0],[0,0,0],[0,0,0]], [[0,1,3,2]]);
    color(plain_color) polyhedron([[0,0,0],[0,0,0],[0,0,0],[0,0,0]], [[0,1,3,2]]);
    color(plain_color) polyhedron([[0,0,0],[0,0,0],[0,0,0],[0,0,0]], [[0,1,3,2]]);
    color(plain_color) polyhedron([[0,0,0],[0,0,0],[0,0,0],[0,0,0]], [[0,1,3,2]]);
    color(plain_color) polyhedron([[0,0,0],[0,0,0],[0,0,0],[0,0,0]], [[0,1,3,2]]);
    color(plain_color) polyhedron([[0,0,0],[0,0,0],[0,0,0],[0,0,0]], [[0,1,3,2]]);
    color(plain_color) polyhedron([[0,0,0],[0,0,0],[0,0,0],[0,0,0]], [[0,1,3,2]]);
    color(plain_color) polyhedron([[0,0,0],[0,0,0],[0,0,0],[0,0,0]], [[0,1,3,2]]);
    color(plain_color) polyhedron([[0,0,0],[0,0,0],[0,0,0],[0,0,0]], [[0,1,3,2]]);
}
